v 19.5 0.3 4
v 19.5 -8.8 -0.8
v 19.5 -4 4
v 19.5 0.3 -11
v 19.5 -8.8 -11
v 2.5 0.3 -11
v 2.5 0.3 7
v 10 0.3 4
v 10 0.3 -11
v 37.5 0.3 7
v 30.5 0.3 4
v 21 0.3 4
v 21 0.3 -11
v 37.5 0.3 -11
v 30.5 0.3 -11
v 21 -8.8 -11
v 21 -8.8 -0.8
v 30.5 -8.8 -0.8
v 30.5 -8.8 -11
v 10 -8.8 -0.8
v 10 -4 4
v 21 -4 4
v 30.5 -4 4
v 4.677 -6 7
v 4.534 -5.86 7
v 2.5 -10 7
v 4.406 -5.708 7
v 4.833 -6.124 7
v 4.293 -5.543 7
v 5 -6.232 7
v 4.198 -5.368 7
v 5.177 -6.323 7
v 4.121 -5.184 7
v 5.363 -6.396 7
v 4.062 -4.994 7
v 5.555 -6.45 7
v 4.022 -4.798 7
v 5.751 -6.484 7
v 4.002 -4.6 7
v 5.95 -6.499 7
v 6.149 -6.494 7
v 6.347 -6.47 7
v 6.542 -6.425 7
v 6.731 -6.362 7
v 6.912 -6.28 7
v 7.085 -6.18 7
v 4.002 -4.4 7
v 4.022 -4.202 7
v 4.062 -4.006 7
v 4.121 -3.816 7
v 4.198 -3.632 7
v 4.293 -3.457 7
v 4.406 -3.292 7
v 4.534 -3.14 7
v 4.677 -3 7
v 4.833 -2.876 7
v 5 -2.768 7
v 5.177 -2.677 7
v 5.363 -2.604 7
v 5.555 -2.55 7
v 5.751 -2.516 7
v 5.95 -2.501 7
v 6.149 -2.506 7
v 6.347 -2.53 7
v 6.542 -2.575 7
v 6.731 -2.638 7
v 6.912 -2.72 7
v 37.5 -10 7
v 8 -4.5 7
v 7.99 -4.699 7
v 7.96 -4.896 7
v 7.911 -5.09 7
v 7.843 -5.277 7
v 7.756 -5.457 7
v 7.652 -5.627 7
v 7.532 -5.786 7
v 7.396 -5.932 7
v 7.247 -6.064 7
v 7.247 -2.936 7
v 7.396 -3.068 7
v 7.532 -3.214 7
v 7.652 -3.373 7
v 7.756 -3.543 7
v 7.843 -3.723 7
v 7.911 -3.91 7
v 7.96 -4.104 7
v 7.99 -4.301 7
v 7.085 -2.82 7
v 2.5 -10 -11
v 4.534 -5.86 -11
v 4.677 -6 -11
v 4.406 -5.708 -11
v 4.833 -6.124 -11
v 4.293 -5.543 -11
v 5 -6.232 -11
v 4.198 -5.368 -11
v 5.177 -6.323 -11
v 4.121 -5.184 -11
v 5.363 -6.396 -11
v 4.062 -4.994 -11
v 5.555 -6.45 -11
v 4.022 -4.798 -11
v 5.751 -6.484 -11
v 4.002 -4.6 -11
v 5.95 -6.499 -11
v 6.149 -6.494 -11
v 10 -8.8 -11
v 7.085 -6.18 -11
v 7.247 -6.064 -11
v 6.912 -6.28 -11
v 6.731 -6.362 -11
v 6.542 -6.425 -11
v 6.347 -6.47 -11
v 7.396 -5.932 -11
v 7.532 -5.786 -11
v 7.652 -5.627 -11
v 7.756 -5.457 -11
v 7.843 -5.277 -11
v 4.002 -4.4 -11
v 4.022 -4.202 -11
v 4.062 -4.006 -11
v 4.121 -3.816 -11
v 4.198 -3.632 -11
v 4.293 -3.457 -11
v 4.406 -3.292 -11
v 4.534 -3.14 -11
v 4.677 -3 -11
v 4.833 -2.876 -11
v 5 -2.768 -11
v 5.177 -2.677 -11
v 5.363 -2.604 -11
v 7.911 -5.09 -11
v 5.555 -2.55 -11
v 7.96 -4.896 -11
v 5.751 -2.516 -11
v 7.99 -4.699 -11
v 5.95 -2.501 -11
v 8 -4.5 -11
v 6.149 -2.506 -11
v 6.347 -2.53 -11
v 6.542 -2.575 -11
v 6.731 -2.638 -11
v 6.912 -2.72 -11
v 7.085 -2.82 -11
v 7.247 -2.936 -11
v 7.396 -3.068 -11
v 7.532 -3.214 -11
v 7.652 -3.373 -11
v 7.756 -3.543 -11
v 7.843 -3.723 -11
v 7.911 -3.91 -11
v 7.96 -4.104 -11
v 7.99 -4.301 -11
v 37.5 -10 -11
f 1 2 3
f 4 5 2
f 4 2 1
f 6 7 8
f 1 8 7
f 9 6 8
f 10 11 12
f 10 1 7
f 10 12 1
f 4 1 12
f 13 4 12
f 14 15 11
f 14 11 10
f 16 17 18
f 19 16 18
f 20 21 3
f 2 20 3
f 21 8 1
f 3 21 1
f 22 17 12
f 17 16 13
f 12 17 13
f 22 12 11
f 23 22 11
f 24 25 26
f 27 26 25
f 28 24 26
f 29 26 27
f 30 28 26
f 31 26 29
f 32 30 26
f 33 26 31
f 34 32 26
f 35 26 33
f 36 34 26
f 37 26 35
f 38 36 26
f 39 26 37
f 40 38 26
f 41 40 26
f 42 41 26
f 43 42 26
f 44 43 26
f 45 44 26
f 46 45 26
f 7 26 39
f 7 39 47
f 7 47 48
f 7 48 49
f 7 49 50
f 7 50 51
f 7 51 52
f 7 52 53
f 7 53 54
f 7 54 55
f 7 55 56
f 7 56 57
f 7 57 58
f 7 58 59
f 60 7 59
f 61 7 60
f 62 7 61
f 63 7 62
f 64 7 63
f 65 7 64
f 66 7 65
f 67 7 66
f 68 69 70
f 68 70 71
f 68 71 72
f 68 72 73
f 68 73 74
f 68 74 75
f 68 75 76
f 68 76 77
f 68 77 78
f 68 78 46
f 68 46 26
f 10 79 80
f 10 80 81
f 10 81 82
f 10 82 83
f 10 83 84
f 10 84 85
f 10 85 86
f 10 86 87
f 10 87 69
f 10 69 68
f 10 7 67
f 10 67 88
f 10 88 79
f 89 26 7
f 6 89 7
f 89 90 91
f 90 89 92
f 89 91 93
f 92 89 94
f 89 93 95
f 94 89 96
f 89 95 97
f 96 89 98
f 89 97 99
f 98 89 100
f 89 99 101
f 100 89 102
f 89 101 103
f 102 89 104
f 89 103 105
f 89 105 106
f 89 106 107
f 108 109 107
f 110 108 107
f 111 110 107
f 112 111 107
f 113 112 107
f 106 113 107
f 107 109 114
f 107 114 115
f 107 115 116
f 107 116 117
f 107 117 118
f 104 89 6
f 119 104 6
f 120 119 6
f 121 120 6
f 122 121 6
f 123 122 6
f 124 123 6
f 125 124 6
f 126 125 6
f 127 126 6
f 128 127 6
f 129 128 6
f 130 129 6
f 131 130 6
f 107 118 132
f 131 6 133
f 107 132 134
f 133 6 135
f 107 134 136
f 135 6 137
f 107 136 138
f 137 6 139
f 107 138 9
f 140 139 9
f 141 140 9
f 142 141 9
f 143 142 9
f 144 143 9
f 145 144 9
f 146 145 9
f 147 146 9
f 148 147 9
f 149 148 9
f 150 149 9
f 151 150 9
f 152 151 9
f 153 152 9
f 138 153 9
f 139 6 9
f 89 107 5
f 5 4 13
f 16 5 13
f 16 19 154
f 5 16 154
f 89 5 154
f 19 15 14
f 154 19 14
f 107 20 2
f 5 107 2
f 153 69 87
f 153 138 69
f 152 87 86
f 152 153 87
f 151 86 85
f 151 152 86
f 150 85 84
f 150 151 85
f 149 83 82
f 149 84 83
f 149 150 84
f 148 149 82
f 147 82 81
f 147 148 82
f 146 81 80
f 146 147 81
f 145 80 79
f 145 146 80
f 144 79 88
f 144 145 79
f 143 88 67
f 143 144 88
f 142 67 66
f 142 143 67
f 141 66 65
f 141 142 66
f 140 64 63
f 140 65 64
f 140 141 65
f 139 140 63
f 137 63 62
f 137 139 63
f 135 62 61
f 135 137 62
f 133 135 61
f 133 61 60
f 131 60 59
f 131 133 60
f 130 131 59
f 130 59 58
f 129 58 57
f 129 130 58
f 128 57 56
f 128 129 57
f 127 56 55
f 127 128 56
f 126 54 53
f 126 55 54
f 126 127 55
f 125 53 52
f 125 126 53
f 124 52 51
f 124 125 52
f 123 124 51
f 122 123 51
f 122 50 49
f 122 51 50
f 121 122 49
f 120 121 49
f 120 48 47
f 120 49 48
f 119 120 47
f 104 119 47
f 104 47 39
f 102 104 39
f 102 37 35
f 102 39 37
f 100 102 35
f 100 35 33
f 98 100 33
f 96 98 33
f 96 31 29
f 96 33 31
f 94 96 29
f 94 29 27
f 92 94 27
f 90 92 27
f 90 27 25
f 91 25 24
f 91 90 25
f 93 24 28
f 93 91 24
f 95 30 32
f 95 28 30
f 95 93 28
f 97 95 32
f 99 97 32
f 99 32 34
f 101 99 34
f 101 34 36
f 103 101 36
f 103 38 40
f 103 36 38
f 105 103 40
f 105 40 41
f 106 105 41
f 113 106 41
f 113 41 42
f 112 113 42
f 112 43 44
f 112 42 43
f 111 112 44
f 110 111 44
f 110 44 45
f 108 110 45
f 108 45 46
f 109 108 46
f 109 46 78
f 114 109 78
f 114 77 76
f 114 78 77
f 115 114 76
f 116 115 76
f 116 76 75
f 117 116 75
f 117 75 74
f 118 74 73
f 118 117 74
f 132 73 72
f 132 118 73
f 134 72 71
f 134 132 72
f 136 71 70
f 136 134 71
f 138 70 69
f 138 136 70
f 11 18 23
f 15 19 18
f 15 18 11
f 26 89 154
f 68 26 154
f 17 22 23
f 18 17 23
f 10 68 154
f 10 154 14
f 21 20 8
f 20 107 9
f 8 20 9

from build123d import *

# Parameters (mm, degrees)
CYLINDER003_R     = 2
CYLINDER003_DEPTH = 20
BOX007_W          = 36
BOX007_H          = 10
BOX007_DEPTH      = 10
BOX007_ROLL_ANGLE = 45
BOX006_W          = 9.5
BOX006_H          = 10
BOX006_DEPTH      = 15
BOX004_W          = 9.5
BOX004_H          = 10
BOX004_DEPTH      = 15
BOX001_W          = 35
BOX001_H          = 10.3
BOX001_DEPTH      = 18


with BuildPart() as zylinder003:
    # Cylinder003 → Cylinder003 (new body)
    with BuildSketch(Plane(origin=(6, -4.5, -12), x_dir=(1, 0, 0), z_dir=(0, 0, 1))):
        Circle(CYLINDER003_R)
    extrude(amount=CYLINDER003_DEPTH)


with BuildPart() as w_rfel007:
    # Box007 → Box007 (new body)
    with BuildSketch(Plane.XY):
        with Locations((18, 5)):
            Rectangle(BOX007_W, BOX007_H)
    extrude(amount=BOX007_DEPTH)


with BuildPart() as w_rfel007_1:
    # Box007 roll: moved
    add(w_rfel007.part.rotate(Axis((0, 0, 0), (1, 0, 0)), BOX007_ROLL_ANGLE))


with BuildPart() as w_rfel007_2:
    # Box007 placement: moved
    add(w_rfel007_1.part.moved(Location((0, -10, -2))))


with BuildPart() as w_rfel006:
    # Box006 → Box006 (new body)
    with BuildSketch(Plane(origin=(21, -8.8, -11), x_dir=(1, 0, 0), z_dir=(0, 0, 1))):
        with Locations((4.75, 5)):
            Rectangle(BOX006_W, BOX006_H)
    extrude(amount=BOX006_DEPTH)


with BuildPart() as cut001:
    # Box004 → Box004 (new body)
    with BuildSketch(Plane(origin=(10, -8.8, -11), x_dir=(1, 0, 0), z_dir=(0, 0, 1))):
        with Locations((4.75, 5)):
            Rectangle(BOX004_W, BOX004_H)
    extrude(amount=BOX004_DEPTH)

    # Fusion007: union Würfel006
    add(w_rfel006.part)

    # Cut001: cut Würfel007
    add(w_rfel007_2.part, mode=Mode.SUBTRACT)


with BuildPart() as cut003:
    # Box001 → Box001 (new body)
    with BuildSketch(Plane(origin=(2.5, -10, -11), x_dir=(1, 0, 0), z_dir=(0, 0, 1))):
        with Locations((17.5, 5.15)):
            Rectangle(BOX001_W, BOX001_H)
    extrude(amount=BOX001_DEPTH)

    # Cut002: cut Cut001
    add(cut001.part, mode=Mode.SUBTRACT)

    # Cut003: cut Zylinder003
    add(zylinder003.part, mode=Mode.SUBTRACT)


solid = cut003.part
